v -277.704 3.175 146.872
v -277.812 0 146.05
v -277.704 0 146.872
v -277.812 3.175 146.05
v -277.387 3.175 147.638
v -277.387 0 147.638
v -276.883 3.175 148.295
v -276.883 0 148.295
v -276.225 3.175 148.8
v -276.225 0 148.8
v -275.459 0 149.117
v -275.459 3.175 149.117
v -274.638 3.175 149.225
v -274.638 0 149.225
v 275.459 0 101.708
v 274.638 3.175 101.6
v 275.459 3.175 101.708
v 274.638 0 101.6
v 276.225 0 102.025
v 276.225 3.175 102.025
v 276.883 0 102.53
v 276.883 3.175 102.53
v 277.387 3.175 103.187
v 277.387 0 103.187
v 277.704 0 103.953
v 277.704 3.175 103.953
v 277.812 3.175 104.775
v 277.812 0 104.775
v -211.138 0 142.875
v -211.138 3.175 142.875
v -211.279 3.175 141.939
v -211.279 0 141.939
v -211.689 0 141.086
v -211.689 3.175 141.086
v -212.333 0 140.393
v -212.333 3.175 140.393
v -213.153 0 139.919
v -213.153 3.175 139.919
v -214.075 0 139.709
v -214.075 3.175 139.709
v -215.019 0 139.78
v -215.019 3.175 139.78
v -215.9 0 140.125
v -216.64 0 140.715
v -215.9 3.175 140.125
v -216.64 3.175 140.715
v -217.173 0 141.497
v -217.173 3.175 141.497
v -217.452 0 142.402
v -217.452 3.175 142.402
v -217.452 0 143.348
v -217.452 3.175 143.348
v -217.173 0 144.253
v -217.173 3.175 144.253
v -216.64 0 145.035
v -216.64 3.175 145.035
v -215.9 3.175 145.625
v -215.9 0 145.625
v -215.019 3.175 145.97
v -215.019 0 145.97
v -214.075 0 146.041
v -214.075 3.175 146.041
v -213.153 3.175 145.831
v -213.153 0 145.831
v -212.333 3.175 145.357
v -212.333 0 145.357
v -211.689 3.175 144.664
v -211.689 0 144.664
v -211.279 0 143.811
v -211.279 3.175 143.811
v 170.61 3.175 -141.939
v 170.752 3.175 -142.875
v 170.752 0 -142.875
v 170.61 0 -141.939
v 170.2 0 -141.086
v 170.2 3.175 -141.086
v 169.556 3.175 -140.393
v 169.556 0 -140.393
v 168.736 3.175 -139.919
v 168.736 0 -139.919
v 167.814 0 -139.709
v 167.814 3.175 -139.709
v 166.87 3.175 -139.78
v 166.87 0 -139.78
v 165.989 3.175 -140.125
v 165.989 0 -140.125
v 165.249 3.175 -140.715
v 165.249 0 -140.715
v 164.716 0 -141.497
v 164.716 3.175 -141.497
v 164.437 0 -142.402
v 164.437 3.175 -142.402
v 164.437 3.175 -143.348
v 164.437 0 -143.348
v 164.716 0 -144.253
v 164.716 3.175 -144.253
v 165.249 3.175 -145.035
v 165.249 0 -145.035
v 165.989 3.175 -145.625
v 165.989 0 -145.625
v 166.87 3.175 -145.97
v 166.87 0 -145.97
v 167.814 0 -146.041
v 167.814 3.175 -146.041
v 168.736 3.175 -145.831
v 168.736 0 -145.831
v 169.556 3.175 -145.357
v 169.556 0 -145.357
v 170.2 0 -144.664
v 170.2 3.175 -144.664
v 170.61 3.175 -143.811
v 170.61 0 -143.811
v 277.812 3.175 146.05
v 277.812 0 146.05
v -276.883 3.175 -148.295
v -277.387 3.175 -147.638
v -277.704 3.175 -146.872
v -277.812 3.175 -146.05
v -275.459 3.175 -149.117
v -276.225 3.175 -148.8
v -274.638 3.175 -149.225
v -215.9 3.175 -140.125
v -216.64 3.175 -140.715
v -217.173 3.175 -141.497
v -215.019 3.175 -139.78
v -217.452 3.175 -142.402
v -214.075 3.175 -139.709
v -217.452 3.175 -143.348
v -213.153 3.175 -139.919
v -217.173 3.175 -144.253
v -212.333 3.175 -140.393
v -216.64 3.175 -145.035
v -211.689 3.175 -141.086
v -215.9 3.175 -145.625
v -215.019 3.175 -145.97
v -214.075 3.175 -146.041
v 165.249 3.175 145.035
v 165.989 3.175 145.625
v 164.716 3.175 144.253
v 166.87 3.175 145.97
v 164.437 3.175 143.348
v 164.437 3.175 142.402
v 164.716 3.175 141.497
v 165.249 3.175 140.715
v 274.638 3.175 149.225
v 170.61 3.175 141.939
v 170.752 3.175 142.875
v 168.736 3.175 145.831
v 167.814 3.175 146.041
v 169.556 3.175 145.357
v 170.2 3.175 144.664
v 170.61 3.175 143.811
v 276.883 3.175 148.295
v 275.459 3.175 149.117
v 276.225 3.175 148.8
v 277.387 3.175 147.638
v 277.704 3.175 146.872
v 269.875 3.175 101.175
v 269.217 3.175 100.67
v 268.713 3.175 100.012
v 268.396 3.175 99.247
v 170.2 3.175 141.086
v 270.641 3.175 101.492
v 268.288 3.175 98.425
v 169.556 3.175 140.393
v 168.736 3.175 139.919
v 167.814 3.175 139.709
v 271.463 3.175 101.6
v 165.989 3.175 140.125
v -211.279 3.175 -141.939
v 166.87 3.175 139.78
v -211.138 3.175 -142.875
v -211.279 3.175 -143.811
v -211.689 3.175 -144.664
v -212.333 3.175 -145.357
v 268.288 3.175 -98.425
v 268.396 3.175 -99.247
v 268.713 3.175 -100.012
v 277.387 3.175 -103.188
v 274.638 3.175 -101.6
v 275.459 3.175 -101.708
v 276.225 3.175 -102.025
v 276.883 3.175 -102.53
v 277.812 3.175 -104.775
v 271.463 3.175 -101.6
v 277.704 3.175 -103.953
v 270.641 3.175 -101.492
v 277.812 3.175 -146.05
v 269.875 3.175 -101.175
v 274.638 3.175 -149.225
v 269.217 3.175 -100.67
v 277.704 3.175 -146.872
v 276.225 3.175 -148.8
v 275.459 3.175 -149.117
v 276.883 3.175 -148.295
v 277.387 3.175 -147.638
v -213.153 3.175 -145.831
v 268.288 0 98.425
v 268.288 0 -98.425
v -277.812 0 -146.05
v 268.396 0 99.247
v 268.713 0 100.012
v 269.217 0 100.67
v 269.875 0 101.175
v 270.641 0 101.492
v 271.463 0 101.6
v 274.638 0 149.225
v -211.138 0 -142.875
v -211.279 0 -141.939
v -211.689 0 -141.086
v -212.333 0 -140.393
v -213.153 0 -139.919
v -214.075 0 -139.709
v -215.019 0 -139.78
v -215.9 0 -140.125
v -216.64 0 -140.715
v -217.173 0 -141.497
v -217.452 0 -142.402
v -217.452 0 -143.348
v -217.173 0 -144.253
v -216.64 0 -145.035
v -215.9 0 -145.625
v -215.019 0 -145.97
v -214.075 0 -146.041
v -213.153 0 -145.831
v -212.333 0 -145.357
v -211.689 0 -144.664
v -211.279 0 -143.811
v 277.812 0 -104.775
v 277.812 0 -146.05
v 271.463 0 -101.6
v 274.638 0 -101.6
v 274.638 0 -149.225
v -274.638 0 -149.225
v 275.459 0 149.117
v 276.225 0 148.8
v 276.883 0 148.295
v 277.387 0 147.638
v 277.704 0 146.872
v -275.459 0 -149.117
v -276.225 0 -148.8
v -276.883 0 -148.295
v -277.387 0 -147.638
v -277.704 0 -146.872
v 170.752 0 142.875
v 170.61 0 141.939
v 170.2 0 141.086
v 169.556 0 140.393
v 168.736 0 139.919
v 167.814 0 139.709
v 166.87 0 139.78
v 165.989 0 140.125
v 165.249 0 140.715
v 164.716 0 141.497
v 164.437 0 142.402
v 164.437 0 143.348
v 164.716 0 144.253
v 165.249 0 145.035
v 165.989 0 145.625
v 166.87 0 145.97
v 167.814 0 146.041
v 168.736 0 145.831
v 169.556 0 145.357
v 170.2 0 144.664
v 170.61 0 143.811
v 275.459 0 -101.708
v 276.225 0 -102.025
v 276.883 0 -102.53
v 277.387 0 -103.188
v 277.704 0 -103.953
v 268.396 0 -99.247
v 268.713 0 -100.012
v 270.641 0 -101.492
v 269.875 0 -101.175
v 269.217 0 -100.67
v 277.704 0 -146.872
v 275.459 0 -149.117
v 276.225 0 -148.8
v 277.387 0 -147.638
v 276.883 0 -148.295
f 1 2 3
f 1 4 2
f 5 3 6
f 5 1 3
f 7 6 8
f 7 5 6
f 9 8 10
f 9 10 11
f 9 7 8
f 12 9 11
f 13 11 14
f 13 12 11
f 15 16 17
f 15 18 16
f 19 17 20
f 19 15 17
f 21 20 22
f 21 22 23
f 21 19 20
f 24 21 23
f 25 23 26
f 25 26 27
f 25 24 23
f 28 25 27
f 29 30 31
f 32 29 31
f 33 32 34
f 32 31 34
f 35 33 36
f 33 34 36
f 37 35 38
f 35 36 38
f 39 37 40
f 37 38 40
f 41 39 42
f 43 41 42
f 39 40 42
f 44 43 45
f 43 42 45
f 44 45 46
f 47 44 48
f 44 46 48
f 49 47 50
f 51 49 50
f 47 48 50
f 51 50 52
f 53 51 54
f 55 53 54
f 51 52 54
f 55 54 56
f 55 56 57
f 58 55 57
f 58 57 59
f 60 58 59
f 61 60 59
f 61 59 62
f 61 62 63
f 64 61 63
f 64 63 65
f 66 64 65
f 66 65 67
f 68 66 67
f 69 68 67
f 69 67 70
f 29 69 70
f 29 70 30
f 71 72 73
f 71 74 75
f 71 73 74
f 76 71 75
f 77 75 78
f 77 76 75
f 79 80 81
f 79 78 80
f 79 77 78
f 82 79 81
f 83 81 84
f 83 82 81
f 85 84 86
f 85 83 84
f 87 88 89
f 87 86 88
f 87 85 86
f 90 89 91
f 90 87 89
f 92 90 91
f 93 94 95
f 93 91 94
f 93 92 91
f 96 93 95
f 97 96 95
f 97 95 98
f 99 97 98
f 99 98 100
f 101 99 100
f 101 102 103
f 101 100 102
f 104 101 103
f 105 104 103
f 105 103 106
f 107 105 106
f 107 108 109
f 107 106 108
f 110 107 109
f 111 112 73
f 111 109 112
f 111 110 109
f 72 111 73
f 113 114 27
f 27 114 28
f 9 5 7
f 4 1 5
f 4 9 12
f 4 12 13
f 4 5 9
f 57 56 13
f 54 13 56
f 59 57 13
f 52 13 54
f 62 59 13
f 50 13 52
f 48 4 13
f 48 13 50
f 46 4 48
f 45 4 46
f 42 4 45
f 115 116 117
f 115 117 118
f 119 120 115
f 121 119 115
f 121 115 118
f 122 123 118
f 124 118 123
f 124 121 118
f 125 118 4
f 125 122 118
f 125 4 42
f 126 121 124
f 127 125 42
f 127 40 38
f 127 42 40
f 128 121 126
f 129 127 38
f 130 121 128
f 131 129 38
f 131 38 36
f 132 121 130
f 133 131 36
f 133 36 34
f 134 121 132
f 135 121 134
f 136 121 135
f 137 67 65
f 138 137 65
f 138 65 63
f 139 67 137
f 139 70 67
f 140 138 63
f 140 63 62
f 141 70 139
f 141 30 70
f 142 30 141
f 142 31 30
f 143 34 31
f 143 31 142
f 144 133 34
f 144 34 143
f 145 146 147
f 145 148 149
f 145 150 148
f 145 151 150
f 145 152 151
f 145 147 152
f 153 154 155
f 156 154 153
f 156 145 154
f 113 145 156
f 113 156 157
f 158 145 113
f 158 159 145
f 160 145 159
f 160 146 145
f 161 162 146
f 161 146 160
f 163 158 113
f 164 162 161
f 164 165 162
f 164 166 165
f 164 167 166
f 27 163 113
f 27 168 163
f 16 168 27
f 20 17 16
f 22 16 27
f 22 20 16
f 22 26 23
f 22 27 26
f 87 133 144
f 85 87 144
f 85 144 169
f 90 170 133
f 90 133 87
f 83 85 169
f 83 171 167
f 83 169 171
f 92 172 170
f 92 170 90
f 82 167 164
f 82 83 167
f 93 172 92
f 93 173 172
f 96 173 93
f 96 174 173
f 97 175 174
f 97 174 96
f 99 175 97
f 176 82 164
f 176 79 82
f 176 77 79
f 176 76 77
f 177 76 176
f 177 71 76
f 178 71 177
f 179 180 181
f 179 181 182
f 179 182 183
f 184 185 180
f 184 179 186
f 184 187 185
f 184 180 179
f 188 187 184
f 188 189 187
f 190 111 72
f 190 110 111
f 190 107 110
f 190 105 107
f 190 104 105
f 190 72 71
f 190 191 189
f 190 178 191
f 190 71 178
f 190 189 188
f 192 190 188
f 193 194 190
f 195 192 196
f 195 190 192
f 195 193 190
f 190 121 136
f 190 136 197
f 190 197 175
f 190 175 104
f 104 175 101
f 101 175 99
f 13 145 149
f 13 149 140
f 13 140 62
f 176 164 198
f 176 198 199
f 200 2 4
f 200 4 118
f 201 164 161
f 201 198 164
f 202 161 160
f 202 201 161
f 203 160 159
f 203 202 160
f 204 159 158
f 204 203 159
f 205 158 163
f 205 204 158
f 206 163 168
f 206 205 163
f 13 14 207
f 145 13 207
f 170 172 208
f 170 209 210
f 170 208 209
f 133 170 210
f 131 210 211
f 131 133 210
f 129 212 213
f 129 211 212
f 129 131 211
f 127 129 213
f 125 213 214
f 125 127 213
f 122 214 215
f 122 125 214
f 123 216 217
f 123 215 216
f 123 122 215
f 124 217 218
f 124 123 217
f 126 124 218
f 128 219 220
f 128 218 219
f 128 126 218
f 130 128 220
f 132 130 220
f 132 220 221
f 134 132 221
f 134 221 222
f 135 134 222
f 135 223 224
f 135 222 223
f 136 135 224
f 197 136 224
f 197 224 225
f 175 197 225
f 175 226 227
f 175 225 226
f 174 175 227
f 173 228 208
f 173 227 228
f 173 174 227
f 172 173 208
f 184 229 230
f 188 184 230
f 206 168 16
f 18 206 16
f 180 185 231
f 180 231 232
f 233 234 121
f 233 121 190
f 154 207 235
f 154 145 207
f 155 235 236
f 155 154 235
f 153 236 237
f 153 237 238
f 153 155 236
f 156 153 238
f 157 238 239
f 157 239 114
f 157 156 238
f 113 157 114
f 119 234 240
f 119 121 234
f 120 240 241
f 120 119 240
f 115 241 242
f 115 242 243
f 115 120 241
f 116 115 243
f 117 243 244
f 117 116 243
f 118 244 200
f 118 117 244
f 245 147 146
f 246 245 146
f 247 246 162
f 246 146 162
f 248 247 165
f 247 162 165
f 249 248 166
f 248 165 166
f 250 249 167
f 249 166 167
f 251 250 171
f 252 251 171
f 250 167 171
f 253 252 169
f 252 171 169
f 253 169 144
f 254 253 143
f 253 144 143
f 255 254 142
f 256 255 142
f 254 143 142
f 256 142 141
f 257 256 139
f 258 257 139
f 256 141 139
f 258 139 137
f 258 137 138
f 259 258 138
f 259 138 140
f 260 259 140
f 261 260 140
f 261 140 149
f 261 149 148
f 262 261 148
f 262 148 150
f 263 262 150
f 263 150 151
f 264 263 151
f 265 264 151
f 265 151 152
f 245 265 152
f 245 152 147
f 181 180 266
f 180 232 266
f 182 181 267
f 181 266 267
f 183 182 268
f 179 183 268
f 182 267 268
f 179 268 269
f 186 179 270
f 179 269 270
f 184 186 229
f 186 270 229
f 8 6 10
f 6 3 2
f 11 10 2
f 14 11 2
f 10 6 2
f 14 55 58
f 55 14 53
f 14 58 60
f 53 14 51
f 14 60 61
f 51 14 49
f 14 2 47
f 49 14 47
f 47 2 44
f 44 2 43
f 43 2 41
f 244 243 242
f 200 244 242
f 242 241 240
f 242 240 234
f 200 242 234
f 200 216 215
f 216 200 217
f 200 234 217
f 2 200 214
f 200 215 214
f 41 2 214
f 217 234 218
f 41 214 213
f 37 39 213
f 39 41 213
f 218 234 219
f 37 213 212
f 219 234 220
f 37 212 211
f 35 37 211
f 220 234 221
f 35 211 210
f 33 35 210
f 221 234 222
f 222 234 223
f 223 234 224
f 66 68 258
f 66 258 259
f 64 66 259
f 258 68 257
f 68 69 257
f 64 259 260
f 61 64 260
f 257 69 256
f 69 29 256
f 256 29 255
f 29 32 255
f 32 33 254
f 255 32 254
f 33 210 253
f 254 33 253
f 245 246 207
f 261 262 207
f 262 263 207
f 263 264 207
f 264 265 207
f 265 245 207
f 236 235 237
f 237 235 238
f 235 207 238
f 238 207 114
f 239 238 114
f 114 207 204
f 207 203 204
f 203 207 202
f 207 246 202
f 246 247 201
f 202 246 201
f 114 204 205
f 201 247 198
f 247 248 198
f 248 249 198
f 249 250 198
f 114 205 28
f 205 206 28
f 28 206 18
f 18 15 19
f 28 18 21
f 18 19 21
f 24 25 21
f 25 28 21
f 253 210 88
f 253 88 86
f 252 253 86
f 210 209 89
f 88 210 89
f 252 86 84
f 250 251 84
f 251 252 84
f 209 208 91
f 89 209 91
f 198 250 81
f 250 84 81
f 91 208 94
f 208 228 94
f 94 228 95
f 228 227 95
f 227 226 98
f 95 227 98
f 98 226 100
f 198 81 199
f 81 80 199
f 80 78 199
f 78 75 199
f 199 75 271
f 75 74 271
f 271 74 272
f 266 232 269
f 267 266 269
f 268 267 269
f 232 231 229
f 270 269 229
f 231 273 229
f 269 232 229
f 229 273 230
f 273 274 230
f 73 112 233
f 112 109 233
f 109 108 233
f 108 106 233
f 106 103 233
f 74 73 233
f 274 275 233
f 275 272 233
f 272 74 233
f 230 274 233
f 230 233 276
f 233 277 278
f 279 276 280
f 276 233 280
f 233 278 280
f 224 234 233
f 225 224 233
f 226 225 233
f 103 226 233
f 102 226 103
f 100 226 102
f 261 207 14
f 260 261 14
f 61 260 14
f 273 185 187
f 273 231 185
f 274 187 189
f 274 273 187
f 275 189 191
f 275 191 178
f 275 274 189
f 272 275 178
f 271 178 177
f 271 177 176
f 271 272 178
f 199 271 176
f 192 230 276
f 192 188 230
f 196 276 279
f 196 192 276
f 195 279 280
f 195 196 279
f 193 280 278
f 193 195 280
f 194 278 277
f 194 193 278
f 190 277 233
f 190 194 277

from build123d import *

# Parameters (mm, degrees)
SKETCH1_W                   = 555.625
SKETCH1_H                   = 298.45
BOSS_EXTRUDE1_DEPTH         = 3.175
SKETCH2_W                   = 9.525
SKETCH2_H                   = 203.2
CUT_EXTRUDE1_DEPTH          = 4.175
FILLET1_R                   = 3.175
F_1_4_0_25_DIAMETER_HOLE1_D = 6.35
FILLET2_R                   = 3.175


with BuildPart() as part:
    # Sketch1 → Boss-Extrude1 (new body)
    with BuildSketch(Plane(origin=(0, 0, 0), x_dir=(1, 0, 0), z_dir=(0, 1, 0))):
        Rectangle(SKETCH1_W, SKETCH1_H)
    extrude(amount=BOSS_EXTRUDE1_DEPTH)

    # Sketch2 → Cut-Extrude1 (cut, through all)
    with BuildSketch(Plane(origin=(0, 3.175, 0), x_dir=(1, 0, 0), z_dir=(0, 1, 0))):
        with Locations((273.05, 0)):
            Rectangle(SKETCH2_W, SKETCH2_H)
    extrude(amount=-CUT_EXTRUDE1_DEPTH, mode=Mode.SUBTRACT)

    # Fillet1
    fillet1_edges = [part.edges().sort_by_distance(p)[0] for p in [
        (268.2875, 1.5875, 101.6),
        (268.2875, 1.5875, -101.6),
    ]]
    fillet(fillet1_edges, radius=FILLET1_R)

    # 1/4 (0.25) Diameter Hole1 (through all)
    with Locations(Plane(origin=(0, 0, 0), x_dir=(-1, 0, 0), z_dir=(0, -1, 0))):
        with Locations((-167.5765, -142.875), (214.3125, -142.875)):
            f_1_4_0_25_diameter_hole1 = Hole(F_1_4_0_25_DIAMETER_HOLE1_D / 2)

    # Mirror1: 1/4 (0.25) Diameter Hole1 across plane
    add(f_1_4_0_25_diameter_hole1.mirror(Plane.XY), mode=Mode.SUBTRACT)

    # Fillet2
    fillet2_edges = [part.edges().sort_by_distance(p)[0] for p in [
        (277.8125, 1.5875, -101.6),
        (277.8125, 1.5875, 101.6),
        (277.8125, 1.5875, 149.225),
        (-277.8125, 1.5875, 149.225),
        (-277.8125, 1.5875, -149.225),
        (277.8125, 1.5875, -149.225),
    ]]
    fillet(fillet2_edges, radius=FILLET2_R)


solid = part.part
